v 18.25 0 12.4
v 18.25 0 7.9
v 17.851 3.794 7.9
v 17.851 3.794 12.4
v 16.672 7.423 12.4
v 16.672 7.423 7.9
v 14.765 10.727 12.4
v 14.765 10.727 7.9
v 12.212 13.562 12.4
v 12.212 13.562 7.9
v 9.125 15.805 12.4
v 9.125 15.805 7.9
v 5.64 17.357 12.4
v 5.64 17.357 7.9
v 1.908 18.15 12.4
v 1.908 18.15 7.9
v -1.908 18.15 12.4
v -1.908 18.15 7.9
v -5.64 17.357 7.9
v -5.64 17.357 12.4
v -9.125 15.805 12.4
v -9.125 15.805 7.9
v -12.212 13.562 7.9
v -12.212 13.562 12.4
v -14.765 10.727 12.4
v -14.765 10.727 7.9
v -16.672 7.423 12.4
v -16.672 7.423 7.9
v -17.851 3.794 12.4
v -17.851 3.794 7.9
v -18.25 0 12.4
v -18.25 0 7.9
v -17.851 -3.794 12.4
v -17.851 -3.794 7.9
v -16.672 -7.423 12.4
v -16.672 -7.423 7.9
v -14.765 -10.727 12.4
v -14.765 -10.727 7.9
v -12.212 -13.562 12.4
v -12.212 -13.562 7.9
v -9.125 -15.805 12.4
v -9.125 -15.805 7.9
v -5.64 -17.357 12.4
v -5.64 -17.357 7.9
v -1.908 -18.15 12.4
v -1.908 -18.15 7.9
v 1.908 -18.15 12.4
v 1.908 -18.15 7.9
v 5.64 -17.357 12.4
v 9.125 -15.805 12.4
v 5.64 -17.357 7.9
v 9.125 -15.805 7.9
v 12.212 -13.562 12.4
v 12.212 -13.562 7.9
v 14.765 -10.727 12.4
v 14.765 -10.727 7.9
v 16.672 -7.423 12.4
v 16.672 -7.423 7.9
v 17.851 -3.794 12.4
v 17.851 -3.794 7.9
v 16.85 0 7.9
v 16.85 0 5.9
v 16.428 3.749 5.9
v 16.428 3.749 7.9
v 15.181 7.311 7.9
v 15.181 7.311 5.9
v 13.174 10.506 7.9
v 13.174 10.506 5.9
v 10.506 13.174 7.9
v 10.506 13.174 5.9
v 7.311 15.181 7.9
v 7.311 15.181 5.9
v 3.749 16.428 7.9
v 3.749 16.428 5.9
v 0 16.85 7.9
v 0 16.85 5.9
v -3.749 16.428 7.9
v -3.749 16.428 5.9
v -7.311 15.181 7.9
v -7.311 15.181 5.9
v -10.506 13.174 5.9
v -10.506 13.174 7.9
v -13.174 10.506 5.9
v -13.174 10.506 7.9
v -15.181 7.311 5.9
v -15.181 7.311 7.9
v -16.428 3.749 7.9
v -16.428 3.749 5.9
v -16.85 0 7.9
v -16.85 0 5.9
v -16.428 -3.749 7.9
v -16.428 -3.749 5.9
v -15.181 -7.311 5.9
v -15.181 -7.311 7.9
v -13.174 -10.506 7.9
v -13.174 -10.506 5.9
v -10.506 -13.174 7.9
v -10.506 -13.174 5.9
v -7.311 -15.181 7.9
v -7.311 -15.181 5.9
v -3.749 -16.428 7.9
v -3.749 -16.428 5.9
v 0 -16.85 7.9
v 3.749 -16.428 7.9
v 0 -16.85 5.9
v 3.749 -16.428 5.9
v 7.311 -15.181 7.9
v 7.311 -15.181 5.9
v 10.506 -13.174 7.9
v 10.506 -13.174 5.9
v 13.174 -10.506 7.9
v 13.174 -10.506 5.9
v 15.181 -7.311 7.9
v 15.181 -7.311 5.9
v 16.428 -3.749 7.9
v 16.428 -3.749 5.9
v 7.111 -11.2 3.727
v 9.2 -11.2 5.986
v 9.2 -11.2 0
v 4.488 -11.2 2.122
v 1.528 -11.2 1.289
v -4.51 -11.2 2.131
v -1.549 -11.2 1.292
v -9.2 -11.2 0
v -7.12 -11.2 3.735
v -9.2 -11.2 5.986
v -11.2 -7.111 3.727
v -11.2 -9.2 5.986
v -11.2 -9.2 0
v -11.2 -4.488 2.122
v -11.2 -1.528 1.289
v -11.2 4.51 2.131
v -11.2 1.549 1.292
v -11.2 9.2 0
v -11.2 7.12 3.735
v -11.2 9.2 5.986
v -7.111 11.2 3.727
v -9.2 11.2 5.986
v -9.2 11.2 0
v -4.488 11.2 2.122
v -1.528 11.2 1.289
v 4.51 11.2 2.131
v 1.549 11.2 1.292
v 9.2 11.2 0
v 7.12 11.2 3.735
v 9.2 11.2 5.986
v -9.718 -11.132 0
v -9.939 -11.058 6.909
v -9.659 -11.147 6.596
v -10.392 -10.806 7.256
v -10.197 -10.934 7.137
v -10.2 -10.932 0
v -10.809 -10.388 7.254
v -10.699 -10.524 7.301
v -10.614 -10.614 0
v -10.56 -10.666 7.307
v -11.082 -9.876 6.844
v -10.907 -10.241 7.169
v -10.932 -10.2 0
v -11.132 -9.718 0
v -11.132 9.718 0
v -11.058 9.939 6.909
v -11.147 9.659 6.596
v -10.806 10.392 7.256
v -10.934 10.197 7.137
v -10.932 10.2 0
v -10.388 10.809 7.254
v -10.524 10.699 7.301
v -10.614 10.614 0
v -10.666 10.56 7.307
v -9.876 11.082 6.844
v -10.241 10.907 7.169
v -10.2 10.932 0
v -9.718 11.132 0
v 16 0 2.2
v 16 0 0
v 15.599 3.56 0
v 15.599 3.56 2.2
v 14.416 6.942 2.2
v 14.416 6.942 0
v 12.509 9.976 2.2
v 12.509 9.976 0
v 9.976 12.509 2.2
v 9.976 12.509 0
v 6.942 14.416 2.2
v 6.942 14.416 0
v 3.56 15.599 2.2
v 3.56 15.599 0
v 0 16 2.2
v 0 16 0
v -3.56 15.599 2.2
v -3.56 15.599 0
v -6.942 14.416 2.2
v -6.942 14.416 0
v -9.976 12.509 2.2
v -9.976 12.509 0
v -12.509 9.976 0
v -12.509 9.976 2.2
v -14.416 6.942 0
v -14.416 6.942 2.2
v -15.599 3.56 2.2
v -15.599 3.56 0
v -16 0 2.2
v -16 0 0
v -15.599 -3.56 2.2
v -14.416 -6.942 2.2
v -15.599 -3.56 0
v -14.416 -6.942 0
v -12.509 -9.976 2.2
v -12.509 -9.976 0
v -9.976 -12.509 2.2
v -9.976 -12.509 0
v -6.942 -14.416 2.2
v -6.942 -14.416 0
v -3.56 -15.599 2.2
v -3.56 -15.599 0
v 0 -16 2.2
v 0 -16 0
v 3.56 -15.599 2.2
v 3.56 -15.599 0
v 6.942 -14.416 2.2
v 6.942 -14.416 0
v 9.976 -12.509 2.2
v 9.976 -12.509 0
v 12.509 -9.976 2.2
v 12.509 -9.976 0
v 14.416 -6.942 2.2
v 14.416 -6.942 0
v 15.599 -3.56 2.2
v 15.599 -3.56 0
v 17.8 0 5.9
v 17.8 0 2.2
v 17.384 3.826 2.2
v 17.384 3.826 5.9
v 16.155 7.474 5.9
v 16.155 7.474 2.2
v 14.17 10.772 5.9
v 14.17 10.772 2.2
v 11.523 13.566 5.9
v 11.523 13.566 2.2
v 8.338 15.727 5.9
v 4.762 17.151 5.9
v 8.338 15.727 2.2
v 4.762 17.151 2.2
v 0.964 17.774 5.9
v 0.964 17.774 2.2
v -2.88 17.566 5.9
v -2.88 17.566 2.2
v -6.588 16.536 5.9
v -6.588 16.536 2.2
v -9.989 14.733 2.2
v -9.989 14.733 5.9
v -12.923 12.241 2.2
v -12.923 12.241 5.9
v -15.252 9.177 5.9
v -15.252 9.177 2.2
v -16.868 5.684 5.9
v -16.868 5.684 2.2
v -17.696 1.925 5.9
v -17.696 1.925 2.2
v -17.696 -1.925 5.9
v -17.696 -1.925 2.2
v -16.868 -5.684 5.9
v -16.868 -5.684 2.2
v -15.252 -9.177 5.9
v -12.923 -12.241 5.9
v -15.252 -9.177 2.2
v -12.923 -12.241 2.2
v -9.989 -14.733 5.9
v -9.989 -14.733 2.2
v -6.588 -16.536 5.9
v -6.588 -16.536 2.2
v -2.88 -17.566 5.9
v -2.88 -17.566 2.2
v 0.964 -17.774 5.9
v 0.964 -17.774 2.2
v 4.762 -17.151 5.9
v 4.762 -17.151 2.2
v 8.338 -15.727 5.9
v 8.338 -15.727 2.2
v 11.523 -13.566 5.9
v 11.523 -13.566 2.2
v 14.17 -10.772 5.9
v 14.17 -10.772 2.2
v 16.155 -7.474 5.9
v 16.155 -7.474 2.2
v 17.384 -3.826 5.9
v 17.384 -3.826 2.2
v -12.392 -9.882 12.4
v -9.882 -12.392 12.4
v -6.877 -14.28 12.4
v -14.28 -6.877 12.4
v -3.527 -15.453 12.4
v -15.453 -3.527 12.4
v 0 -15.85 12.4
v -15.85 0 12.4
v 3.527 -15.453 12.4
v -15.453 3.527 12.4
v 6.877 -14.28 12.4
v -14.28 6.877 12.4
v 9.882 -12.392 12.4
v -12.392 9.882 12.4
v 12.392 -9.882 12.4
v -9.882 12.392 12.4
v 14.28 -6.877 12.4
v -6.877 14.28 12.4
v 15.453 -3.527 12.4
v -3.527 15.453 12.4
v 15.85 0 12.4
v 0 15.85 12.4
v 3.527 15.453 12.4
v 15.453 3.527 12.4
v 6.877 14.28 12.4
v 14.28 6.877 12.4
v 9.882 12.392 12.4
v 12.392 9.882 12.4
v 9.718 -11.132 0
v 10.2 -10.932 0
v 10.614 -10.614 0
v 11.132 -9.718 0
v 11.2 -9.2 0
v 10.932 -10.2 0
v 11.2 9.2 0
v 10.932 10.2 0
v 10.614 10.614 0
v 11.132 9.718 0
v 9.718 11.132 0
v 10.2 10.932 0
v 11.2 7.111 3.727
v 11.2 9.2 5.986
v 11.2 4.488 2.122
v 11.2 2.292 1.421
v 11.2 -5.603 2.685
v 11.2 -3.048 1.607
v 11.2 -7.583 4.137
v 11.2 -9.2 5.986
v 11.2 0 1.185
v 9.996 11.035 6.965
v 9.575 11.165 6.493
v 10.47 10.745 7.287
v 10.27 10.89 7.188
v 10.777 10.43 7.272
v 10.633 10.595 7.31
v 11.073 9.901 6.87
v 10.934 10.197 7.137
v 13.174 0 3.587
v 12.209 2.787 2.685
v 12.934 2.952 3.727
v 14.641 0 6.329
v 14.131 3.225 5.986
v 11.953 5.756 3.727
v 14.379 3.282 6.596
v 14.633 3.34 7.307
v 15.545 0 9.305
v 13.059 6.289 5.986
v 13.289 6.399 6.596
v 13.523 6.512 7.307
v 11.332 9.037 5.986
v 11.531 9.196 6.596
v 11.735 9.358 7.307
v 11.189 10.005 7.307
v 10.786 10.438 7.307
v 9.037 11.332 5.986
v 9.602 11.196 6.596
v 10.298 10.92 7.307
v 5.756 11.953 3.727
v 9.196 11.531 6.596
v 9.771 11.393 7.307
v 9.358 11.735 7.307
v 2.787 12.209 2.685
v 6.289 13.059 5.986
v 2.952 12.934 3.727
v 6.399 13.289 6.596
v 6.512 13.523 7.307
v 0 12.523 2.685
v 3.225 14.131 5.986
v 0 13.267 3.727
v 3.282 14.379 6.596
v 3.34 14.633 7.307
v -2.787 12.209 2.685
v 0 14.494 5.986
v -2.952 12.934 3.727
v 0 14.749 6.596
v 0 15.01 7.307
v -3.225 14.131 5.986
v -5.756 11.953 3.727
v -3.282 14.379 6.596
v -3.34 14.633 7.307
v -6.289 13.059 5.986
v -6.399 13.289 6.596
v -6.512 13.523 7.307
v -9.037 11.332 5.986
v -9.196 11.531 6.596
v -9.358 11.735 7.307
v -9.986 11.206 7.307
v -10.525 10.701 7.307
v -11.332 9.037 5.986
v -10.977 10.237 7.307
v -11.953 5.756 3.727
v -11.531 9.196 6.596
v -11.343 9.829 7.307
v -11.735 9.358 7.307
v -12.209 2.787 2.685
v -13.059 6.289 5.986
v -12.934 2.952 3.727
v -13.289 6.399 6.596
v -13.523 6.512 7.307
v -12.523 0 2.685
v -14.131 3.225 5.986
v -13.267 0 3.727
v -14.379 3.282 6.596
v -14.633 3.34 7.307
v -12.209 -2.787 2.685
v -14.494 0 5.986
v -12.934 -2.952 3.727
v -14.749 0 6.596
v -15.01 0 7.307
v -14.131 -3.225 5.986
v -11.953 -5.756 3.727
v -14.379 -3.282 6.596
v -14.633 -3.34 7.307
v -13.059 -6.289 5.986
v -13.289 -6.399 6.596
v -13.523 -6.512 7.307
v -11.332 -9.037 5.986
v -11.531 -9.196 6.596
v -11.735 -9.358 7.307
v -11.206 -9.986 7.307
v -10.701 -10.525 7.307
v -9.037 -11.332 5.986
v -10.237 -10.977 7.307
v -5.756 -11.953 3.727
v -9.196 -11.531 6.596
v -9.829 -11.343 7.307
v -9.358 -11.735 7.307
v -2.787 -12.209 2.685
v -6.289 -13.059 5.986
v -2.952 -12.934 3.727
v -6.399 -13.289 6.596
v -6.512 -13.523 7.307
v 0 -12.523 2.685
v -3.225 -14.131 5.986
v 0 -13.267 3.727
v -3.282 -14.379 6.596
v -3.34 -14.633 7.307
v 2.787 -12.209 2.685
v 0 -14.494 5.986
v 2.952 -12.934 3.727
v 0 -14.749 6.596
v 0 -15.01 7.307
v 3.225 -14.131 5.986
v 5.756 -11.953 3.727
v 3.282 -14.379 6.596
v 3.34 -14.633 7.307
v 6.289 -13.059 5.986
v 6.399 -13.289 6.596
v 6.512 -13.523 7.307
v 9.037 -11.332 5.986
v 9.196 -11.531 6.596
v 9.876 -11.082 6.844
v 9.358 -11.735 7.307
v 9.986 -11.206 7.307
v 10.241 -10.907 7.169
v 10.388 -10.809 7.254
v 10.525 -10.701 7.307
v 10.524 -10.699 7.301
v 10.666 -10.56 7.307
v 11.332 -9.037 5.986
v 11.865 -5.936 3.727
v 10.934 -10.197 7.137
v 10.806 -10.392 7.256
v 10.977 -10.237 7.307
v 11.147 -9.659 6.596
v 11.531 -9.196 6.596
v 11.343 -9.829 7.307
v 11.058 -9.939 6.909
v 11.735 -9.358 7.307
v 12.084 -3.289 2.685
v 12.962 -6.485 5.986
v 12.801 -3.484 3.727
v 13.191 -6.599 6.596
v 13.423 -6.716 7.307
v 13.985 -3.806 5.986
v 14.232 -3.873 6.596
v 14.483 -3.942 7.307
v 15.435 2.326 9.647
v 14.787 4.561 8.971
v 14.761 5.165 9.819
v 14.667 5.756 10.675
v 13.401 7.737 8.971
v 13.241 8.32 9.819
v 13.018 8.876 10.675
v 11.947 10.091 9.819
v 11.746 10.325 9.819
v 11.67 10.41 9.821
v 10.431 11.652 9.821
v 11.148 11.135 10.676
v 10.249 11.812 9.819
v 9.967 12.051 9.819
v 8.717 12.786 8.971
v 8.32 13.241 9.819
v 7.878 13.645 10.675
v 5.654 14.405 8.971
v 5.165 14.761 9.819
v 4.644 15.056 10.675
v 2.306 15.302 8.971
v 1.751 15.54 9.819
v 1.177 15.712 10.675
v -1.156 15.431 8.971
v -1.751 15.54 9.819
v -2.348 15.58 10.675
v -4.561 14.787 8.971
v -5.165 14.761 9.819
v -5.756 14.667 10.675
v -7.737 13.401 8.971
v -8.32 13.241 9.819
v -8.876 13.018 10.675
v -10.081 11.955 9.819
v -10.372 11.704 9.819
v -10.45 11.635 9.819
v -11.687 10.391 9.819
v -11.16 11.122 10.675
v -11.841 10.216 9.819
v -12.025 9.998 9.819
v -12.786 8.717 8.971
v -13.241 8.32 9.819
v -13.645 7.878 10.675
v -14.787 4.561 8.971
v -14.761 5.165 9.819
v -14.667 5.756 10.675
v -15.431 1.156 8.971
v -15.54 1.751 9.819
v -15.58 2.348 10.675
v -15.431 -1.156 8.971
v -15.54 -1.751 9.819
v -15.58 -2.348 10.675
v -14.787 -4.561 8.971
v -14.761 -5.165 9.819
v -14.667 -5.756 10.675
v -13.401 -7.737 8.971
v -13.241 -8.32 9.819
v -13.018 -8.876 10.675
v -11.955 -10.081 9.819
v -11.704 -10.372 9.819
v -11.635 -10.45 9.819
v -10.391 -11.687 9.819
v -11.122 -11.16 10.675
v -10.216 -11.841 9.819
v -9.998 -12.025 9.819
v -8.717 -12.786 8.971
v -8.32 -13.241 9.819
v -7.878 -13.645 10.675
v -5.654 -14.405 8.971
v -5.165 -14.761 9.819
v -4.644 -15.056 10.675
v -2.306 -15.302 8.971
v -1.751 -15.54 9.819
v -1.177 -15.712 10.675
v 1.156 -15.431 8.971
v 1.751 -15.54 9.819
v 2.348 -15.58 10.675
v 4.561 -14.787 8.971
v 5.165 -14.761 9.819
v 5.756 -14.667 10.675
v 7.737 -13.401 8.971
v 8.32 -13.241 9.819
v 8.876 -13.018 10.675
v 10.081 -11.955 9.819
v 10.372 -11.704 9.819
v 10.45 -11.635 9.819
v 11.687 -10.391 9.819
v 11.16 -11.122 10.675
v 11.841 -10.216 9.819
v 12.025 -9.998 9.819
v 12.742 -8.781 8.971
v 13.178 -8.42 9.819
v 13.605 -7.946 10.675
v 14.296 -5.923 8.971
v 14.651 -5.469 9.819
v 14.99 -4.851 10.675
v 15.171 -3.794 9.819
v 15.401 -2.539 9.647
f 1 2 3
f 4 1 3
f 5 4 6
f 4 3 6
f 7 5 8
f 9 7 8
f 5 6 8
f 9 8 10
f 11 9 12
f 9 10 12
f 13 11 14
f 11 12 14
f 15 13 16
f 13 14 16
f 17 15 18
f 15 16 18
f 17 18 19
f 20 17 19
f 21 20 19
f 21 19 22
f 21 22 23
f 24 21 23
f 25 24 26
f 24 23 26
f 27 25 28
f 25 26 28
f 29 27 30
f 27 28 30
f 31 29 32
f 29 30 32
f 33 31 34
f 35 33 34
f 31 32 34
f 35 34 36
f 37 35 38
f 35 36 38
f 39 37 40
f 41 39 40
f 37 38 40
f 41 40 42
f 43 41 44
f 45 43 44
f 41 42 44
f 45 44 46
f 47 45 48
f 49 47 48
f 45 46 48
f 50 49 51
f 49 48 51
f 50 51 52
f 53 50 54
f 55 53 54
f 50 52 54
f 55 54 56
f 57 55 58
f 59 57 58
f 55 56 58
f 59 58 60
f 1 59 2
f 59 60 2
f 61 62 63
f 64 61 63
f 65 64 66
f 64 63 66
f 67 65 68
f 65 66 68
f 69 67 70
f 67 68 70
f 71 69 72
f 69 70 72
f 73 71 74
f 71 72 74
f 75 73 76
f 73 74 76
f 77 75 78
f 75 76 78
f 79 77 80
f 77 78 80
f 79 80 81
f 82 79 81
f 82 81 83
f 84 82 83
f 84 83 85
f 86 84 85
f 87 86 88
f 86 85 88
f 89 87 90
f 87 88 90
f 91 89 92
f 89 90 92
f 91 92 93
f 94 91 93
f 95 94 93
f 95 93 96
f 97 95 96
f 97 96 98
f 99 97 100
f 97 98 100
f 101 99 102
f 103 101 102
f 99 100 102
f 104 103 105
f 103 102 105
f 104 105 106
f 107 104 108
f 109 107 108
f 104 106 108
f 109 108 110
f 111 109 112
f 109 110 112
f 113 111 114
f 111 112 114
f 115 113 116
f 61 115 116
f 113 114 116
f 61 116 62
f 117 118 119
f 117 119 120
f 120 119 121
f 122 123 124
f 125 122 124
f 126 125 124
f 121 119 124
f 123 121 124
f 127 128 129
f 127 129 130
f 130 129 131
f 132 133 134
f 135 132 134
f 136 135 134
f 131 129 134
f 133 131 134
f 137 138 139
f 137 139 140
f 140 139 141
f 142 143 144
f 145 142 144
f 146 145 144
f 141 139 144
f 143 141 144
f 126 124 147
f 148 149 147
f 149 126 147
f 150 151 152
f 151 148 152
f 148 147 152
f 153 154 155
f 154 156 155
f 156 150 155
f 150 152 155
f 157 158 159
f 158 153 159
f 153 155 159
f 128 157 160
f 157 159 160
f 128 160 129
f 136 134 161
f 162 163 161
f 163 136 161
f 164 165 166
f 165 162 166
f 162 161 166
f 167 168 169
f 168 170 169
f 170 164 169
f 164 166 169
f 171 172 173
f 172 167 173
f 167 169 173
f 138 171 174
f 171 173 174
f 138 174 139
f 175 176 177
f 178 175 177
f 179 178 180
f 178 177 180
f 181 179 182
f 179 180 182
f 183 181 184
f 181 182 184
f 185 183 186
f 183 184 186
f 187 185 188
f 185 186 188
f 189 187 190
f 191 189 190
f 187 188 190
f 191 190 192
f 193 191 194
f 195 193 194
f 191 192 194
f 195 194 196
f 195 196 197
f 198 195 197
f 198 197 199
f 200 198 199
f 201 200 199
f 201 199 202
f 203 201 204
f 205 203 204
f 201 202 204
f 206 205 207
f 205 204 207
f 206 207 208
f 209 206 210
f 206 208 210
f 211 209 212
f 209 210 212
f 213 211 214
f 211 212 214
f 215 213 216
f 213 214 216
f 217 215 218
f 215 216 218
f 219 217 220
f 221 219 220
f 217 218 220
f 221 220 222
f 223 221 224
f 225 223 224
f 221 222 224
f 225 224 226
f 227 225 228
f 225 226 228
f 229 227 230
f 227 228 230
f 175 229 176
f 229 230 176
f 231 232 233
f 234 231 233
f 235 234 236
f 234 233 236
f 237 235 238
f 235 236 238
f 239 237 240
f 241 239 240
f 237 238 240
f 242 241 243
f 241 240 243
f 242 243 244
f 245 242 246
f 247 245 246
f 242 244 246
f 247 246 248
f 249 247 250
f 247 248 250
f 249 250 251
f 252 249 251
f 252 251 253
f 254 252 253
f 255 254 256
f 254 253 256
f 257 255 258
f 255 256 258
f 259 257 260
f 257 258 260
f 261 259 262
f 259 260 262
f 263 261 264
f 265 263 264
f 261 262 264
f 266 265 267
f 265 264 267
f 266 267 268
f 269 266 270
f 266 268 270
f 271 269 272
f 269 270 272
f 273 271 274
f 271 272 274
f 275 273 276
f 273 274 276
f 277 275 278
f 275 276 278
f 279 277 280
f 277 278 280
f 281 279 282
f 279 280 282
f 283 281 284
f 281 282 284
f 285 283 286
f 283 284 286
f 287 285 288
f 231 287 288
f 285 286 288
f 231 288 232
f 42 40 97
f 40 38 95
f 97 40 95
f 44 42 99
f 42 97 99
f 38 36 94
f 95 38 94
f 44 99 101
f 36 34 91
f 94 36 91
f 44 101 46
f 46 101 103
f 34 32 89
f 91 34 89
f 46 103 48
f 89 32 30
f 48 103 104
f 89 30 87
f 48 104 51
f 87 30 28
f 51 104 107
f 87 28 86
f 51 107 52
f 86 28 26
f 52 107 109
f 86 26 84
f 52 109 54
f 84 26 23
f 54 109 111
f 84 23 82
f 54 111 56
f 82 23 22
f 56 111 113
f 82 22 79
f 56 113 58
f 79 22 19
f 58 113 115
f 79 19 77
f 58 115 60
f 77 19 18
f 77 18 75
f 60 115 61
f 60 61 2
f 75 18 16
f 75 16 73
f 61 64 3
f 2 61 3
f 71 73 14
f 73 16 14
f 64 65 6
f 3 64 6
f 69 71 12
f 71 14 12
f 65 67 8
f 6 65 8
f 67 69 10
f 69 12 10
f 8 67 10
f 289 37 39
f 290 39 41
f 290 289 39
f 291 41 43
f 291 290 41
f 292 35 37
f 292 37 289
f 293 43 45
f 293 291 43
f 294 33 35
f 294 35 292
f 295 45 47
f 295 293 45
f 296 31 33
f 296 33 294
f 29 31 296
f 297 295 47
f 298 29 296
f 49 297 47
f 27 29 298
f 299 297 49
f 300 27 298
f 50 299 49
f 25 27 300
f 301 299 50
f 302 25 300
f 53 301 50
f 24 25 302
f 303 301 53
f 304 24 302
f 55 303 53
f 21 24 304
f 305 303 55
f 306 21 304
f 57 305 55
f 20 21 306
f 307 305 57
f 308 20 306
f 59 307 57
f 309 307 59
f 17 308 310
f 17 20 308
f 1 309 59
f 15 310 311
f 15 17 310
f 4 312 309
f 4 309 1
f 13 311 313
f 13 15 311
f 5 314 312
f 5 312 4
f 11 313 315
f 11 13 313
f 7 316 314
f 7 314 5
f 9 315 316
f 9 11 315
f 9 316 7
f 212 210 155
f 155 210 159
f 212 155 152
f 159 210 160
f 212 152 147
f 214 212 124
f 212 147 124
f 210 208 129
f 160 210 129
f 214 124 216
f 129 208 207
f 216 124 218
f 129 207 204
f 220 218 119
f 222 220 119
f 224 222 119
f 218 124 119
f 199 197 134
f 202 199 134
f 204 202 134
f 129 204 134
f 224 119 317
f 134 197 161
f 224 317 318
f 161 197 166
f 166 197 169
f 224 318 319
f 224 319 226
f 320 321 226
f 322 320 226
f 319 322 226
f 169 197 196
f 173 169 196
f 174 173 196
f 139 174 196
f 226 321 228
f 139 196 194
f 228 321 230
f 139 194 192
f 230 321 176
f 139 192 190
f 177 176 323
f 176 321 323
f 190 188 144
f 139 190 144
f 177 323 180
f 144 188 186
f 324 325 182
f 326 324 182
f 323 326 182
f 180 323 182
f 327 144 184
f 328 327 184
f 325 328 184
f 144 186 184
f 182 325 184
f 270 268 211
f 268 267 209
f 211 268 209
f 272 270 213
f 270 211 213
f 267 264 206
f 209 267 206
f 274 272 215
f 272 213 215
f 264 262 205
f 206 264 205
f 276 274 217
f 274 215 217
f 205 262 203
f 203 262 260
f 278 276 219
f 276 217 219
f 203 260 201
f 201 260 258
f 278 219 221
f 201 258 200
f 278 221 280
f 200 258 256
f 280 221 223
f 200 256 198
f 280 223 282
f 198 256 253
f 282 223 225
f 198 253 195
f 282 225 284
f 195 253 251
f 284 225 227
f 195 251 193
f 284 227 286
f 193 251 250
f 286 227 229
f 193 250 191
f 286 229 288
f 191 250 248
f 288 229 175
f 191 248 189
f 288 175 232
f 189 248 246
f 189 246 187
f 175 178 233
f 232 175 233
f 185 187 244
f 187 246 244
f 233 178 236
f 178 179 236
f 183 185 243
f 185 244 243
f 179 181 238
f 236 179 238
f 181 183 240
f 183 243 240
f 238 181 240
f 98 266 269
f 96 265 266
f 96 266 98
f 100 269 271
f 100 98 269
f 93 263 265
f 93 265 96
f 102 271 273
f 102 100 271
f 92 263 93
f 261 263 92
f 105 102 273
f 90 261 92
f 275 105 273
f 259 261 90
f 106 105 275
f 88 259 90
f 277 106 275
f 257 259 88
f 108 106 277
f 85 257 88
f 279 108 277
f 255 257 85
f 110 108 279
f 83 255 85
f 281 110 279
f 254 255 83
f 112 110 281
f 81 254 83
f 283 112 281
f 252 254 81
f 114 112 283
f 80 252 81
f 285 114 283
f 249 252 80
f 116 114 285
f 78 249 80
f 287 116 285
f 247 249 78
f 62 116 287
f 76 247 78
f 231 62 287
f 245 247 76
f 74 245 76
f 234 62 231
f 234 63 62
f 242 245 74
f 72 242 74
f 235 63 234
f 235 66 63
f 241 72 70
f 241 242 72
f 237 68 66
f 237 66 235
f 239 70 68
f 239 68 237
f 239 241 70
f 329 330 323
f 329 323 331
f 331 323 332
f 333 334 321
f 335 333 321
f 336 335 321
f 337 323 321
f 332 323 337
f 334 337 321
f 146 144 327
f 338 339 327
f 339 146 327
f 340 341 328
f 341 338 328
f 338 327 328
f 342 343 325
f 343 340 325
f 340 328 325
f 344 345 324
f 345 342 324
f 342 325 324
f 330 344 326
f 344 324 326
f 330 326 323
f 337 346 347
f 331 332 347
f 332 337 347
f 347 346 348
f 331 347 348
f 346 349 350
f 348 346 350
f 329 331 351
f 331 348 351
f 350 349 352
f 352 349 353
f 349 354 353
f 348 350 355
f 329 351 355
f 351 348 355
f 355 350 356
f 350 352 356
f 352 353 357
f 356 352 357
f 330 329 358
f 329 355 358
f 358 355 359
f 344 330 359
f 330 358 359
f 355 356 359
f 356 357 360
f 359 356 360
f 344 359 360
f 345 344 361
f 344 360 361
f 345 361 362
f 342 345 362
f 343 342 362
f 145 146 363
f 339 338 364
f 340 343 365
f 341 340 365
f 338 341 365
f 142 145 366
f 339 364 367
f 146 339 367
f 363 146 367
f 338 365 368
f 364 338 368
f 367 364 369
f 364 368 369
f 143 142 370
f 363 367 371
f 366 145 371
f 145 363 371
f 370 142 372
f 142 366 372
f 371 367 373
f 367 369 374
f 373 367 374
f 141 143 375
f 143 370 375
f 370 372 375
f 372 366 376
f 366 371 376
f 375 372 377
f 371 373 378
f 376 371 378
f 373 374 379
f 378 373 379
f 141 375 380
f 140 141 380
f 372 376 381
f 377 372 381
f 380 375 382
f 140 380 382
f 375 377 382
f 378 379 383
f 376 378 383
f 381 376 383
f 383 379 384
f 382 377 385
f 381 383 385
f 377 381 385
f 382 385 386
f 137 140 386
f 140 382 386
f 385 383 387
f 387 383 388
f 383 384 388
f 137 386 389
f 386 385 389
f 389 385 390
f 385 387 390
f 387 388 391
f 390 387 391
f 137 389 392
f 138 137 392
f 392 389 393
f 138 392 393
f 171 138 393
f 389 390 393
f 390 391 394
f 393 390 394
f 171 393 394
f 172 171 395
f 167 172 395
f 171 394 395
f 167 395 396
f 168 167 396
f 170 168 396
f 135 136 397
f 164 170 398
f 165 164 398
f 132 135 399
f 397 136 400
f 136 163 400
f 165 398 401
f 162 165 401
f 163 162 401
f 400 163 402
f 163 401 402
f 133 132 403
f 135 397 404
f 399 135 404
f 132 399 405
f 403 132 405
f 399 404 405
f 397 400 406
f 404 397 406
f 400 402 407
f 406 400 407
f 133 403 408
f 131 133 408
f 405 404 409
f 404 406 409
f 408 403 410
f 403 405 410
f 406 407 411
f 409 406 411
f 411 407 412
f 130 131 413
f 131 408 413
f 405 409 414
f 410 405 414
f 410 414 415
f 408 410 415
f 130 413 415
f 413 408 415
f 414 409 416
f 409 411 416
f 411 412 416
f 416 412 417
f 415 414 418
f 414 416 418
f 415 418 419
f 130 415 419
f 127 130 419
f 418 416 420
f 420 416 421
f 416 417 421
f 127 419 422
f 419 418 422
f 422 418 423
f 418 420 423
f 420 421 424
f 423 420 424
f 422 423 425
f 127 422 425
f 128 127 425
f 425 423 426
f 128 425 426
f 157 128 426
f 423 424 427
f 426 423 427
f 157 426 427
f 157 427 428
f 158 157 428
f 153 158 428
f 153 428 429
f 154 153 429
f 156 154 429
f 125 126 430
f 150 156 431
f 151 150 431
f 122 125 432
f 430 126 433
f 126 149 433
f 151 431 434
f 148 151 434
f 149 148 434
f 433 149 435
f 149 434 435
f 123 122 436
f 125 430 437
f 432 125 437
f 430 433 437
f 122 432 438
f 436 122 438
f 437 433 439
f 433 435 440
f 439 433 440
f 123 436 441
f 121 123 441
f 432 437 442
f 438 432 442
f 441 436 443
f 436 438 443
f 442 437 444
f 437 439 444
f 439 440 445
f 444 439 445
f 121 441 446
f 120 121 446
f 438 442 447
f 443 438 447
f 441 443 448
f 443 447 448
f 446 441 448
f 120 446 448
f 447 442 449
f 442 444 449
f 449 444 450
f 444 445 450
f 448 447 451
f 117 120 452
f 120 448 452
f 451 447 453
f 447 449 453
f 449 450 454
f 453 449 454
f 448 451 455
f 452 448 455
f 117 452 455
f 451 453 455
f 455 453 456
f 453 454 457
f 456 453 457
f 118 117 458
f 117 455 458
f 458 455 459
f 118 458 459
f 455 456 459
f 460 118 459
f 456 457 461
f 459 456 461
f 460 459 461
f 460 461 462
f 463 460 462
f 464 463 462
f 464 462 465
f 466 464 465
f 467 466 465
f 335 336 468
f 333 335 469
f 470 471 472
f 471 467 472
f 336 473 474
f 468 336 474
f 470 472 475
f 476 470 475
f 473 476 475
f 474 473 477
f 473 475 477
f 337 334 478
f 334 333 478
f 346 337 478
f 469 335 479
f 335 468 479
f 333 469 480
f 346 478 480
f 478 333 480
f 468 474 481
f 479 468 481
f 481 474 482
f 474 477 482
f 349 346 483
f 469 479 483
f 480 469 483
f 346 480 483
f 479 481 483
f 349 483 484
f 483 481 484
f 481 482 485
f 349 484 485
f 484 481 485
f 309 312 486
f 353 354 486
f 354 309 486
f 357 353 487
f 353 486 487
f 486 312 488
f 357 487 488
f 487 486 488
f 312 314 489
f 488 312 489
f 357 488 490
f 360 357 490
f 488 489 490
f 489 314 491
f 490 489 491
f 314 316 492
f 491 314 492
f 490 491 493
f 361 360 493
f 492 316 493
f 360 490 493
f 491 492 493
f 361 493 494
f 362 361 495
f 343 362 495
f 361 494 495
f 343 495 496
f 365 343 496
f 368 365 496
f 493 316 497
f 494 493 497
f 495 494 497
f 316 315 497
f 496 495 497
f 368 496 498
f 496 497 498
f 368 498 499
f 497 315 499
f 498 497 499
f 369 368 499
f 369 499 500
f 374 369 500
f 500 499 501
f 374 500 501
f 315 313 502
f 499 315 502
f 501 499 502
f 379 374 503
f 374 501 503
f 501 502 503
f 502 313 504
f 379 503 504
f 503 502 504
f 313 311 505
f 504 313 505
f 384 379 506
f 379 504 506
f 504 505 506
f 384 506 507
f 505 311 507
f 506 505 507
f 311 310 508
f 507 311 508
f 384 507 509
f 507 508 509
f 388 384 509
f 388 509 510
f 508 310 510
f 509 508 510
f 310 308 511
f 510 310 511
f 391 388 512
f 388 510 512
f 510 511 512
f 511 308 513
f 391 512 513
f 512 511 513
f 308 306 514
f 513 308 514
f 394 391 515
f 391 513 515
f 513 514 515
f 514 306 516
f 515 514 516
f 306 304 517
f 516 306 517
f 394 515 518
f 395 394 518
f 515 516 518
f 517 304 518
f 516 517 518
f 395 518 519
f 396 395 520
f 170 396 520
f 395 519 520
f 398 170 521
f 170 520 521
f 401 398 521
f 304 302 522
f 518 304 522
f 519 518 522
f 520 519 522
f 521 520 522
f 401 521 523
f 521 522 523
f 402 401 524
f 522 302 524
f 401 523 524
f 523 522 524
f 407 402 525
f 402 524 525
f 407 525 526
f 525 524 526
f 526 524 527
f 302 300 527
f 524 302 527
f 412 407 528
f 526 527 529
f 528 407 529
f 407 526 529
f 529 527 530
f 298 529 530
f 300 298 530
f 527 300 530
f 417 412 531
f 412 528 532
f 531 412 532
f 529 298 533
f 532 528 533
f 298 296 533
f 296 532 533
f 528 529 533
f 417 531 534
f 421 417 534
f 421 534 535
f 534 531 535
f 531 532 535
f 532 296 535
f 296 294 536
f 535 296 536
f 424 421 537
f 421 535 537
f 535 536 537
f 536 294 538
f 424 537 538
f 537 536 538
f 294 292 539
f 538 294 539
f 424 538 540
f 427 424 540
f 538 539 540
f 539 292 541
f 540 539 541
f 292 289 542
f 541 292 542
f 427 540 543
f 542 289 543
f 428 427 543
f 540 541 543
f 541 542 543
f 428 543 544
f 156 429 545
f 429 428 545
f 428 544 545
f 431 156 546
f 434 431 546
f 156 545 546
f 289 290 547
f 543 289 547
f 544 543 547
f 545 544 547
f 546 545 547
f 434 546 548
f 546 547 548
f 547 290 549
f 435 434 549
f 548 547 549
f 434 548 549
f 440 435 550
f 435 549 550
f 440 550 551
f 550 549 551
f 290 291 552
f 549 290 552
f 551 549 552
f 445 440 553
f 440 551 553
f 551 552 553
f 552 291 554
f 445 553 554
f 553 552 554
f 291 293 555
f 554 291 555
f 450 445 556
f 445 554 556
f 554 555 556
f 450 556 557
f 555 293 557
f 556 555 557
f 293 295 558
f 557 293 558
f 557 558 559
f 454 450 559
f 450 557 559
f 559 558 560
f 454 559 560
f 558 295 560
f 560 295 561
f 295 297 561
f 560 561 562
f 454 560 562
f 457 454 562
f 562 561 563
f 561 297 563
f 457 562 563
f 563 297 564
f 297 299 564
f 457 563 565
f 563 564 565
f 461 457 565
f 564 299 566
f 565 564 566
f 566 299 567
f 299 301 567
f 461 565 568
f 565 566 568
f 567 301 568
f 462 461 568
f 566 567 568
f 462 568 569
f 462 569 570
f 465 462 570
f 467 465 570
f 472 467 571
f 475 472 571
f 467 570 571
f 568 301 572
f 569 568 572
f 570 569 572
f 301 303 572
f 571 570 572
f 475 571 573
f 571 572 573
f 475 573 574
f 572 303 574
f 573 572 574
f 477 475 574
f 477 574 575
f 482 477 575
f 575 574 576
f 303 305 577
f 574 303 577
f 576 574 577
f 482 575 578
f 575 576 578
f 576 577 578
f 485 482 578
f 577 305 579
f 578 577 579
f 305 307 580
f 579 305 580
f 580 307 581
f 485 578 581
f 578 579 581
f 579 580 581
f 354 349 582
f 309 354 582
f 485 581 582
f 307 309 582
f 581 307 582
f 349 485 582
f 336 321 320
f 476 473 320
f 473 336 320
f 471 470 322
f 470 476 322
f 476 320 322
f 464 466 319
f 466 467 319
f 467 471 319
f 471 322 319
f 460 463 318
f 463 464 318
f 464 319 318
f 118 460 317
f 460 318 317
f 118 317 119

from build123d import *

# Parameters (mm, degrees)
F0_R     = 16
F1_DEPTH = 2.2
F2_R     = 17.8
F3_DEPTH = 3.7
F4_R     = 16.85
F5_DEPTH = 2
F6_R     = 18.25
F7_DEPTH = 4.5
F9_DEPTH = 12.401


with BuildPart() as f1:
    # F0 (on Top) → F1 (new body)
    with BuildSketch(Plane.XY):
        Circle(F0_R)
    extrude(amount=F1_DEPTH)

    # F2 (on face) → F3 (join)
    with BuildSketch(Plane.XY.offset(2.2)):
        Circle(F2_R)
    extrude(amount=F3_DEPTH)

    # F4 (on face) → F5 (join)
    with BuildSketch(Plane.XY.offset(5.9)):
        Circle(F4_R)
    extrude(amount=F5_DEPTH)

    # F6 (on face) → F7 (join)
    with BuildSketch(Plane.XY.offset(7.9)):
        Circle(F6_R)
    extrude(amount=F7_DEPTH)

    # F8 (on face) → F9 (cut, through all)
    with BuildSketch(Plane(origin=(0, 0, 0), x_dir=(1, 0, 0), z_dir=(0, 0, -1))):
        with BuildLine():
            Line((11.2, -9.2), (11.2, 0))
            Line((11.2, 0), (11.2, 9.2))
            ThreePointArc((11.2, 9.2), (10.614214, 10.614214), (9.2, 11.2))
            Line((9.2, 11.2), (-9.2, 11.2))
            ThreePointArc((-9.2, 11.2), (-10.614214, 10.614214), (-11.2, 9.2))
            Line((-11.2, 9.2), (-11.2, -9.2))
            ThreePointArc((-11.2, -9.2), (-10.614214, -10.614214), (-9.2, -11.2))
            Line((-9.2, -11.2), (9.2, -11.2))
            ThreePointArc((9.2, -11.2), (10.614214, -10.614214), (11.2, -9.2))
        make_face()
    extrude(amount=-F9_DEPTH, mode=Mode.SUBTRACT)

    # F10 (on Front) → F11 (revolve, cut)
    with BuildSketch(Plane.XZ):
        with BuildLine():
            Line((0, 12.4), (0, 0))
            Line((0, 0), (0, -3.45))
            ThreePointArc((0, -3.45), (11.207642, 1.192358), (15.85, 12.4))
            ThreePointArc((15.85, 12.4), (11.207642, 23.607642), (0, 28.25))
            Line((0, 28.25), (0, 12.4))
        make_face()
    revolve(axis=Axis((0, 0, 6.2), (0, 0, 1)), mode=Mode.SUBTRACT)


solid = f1.part
